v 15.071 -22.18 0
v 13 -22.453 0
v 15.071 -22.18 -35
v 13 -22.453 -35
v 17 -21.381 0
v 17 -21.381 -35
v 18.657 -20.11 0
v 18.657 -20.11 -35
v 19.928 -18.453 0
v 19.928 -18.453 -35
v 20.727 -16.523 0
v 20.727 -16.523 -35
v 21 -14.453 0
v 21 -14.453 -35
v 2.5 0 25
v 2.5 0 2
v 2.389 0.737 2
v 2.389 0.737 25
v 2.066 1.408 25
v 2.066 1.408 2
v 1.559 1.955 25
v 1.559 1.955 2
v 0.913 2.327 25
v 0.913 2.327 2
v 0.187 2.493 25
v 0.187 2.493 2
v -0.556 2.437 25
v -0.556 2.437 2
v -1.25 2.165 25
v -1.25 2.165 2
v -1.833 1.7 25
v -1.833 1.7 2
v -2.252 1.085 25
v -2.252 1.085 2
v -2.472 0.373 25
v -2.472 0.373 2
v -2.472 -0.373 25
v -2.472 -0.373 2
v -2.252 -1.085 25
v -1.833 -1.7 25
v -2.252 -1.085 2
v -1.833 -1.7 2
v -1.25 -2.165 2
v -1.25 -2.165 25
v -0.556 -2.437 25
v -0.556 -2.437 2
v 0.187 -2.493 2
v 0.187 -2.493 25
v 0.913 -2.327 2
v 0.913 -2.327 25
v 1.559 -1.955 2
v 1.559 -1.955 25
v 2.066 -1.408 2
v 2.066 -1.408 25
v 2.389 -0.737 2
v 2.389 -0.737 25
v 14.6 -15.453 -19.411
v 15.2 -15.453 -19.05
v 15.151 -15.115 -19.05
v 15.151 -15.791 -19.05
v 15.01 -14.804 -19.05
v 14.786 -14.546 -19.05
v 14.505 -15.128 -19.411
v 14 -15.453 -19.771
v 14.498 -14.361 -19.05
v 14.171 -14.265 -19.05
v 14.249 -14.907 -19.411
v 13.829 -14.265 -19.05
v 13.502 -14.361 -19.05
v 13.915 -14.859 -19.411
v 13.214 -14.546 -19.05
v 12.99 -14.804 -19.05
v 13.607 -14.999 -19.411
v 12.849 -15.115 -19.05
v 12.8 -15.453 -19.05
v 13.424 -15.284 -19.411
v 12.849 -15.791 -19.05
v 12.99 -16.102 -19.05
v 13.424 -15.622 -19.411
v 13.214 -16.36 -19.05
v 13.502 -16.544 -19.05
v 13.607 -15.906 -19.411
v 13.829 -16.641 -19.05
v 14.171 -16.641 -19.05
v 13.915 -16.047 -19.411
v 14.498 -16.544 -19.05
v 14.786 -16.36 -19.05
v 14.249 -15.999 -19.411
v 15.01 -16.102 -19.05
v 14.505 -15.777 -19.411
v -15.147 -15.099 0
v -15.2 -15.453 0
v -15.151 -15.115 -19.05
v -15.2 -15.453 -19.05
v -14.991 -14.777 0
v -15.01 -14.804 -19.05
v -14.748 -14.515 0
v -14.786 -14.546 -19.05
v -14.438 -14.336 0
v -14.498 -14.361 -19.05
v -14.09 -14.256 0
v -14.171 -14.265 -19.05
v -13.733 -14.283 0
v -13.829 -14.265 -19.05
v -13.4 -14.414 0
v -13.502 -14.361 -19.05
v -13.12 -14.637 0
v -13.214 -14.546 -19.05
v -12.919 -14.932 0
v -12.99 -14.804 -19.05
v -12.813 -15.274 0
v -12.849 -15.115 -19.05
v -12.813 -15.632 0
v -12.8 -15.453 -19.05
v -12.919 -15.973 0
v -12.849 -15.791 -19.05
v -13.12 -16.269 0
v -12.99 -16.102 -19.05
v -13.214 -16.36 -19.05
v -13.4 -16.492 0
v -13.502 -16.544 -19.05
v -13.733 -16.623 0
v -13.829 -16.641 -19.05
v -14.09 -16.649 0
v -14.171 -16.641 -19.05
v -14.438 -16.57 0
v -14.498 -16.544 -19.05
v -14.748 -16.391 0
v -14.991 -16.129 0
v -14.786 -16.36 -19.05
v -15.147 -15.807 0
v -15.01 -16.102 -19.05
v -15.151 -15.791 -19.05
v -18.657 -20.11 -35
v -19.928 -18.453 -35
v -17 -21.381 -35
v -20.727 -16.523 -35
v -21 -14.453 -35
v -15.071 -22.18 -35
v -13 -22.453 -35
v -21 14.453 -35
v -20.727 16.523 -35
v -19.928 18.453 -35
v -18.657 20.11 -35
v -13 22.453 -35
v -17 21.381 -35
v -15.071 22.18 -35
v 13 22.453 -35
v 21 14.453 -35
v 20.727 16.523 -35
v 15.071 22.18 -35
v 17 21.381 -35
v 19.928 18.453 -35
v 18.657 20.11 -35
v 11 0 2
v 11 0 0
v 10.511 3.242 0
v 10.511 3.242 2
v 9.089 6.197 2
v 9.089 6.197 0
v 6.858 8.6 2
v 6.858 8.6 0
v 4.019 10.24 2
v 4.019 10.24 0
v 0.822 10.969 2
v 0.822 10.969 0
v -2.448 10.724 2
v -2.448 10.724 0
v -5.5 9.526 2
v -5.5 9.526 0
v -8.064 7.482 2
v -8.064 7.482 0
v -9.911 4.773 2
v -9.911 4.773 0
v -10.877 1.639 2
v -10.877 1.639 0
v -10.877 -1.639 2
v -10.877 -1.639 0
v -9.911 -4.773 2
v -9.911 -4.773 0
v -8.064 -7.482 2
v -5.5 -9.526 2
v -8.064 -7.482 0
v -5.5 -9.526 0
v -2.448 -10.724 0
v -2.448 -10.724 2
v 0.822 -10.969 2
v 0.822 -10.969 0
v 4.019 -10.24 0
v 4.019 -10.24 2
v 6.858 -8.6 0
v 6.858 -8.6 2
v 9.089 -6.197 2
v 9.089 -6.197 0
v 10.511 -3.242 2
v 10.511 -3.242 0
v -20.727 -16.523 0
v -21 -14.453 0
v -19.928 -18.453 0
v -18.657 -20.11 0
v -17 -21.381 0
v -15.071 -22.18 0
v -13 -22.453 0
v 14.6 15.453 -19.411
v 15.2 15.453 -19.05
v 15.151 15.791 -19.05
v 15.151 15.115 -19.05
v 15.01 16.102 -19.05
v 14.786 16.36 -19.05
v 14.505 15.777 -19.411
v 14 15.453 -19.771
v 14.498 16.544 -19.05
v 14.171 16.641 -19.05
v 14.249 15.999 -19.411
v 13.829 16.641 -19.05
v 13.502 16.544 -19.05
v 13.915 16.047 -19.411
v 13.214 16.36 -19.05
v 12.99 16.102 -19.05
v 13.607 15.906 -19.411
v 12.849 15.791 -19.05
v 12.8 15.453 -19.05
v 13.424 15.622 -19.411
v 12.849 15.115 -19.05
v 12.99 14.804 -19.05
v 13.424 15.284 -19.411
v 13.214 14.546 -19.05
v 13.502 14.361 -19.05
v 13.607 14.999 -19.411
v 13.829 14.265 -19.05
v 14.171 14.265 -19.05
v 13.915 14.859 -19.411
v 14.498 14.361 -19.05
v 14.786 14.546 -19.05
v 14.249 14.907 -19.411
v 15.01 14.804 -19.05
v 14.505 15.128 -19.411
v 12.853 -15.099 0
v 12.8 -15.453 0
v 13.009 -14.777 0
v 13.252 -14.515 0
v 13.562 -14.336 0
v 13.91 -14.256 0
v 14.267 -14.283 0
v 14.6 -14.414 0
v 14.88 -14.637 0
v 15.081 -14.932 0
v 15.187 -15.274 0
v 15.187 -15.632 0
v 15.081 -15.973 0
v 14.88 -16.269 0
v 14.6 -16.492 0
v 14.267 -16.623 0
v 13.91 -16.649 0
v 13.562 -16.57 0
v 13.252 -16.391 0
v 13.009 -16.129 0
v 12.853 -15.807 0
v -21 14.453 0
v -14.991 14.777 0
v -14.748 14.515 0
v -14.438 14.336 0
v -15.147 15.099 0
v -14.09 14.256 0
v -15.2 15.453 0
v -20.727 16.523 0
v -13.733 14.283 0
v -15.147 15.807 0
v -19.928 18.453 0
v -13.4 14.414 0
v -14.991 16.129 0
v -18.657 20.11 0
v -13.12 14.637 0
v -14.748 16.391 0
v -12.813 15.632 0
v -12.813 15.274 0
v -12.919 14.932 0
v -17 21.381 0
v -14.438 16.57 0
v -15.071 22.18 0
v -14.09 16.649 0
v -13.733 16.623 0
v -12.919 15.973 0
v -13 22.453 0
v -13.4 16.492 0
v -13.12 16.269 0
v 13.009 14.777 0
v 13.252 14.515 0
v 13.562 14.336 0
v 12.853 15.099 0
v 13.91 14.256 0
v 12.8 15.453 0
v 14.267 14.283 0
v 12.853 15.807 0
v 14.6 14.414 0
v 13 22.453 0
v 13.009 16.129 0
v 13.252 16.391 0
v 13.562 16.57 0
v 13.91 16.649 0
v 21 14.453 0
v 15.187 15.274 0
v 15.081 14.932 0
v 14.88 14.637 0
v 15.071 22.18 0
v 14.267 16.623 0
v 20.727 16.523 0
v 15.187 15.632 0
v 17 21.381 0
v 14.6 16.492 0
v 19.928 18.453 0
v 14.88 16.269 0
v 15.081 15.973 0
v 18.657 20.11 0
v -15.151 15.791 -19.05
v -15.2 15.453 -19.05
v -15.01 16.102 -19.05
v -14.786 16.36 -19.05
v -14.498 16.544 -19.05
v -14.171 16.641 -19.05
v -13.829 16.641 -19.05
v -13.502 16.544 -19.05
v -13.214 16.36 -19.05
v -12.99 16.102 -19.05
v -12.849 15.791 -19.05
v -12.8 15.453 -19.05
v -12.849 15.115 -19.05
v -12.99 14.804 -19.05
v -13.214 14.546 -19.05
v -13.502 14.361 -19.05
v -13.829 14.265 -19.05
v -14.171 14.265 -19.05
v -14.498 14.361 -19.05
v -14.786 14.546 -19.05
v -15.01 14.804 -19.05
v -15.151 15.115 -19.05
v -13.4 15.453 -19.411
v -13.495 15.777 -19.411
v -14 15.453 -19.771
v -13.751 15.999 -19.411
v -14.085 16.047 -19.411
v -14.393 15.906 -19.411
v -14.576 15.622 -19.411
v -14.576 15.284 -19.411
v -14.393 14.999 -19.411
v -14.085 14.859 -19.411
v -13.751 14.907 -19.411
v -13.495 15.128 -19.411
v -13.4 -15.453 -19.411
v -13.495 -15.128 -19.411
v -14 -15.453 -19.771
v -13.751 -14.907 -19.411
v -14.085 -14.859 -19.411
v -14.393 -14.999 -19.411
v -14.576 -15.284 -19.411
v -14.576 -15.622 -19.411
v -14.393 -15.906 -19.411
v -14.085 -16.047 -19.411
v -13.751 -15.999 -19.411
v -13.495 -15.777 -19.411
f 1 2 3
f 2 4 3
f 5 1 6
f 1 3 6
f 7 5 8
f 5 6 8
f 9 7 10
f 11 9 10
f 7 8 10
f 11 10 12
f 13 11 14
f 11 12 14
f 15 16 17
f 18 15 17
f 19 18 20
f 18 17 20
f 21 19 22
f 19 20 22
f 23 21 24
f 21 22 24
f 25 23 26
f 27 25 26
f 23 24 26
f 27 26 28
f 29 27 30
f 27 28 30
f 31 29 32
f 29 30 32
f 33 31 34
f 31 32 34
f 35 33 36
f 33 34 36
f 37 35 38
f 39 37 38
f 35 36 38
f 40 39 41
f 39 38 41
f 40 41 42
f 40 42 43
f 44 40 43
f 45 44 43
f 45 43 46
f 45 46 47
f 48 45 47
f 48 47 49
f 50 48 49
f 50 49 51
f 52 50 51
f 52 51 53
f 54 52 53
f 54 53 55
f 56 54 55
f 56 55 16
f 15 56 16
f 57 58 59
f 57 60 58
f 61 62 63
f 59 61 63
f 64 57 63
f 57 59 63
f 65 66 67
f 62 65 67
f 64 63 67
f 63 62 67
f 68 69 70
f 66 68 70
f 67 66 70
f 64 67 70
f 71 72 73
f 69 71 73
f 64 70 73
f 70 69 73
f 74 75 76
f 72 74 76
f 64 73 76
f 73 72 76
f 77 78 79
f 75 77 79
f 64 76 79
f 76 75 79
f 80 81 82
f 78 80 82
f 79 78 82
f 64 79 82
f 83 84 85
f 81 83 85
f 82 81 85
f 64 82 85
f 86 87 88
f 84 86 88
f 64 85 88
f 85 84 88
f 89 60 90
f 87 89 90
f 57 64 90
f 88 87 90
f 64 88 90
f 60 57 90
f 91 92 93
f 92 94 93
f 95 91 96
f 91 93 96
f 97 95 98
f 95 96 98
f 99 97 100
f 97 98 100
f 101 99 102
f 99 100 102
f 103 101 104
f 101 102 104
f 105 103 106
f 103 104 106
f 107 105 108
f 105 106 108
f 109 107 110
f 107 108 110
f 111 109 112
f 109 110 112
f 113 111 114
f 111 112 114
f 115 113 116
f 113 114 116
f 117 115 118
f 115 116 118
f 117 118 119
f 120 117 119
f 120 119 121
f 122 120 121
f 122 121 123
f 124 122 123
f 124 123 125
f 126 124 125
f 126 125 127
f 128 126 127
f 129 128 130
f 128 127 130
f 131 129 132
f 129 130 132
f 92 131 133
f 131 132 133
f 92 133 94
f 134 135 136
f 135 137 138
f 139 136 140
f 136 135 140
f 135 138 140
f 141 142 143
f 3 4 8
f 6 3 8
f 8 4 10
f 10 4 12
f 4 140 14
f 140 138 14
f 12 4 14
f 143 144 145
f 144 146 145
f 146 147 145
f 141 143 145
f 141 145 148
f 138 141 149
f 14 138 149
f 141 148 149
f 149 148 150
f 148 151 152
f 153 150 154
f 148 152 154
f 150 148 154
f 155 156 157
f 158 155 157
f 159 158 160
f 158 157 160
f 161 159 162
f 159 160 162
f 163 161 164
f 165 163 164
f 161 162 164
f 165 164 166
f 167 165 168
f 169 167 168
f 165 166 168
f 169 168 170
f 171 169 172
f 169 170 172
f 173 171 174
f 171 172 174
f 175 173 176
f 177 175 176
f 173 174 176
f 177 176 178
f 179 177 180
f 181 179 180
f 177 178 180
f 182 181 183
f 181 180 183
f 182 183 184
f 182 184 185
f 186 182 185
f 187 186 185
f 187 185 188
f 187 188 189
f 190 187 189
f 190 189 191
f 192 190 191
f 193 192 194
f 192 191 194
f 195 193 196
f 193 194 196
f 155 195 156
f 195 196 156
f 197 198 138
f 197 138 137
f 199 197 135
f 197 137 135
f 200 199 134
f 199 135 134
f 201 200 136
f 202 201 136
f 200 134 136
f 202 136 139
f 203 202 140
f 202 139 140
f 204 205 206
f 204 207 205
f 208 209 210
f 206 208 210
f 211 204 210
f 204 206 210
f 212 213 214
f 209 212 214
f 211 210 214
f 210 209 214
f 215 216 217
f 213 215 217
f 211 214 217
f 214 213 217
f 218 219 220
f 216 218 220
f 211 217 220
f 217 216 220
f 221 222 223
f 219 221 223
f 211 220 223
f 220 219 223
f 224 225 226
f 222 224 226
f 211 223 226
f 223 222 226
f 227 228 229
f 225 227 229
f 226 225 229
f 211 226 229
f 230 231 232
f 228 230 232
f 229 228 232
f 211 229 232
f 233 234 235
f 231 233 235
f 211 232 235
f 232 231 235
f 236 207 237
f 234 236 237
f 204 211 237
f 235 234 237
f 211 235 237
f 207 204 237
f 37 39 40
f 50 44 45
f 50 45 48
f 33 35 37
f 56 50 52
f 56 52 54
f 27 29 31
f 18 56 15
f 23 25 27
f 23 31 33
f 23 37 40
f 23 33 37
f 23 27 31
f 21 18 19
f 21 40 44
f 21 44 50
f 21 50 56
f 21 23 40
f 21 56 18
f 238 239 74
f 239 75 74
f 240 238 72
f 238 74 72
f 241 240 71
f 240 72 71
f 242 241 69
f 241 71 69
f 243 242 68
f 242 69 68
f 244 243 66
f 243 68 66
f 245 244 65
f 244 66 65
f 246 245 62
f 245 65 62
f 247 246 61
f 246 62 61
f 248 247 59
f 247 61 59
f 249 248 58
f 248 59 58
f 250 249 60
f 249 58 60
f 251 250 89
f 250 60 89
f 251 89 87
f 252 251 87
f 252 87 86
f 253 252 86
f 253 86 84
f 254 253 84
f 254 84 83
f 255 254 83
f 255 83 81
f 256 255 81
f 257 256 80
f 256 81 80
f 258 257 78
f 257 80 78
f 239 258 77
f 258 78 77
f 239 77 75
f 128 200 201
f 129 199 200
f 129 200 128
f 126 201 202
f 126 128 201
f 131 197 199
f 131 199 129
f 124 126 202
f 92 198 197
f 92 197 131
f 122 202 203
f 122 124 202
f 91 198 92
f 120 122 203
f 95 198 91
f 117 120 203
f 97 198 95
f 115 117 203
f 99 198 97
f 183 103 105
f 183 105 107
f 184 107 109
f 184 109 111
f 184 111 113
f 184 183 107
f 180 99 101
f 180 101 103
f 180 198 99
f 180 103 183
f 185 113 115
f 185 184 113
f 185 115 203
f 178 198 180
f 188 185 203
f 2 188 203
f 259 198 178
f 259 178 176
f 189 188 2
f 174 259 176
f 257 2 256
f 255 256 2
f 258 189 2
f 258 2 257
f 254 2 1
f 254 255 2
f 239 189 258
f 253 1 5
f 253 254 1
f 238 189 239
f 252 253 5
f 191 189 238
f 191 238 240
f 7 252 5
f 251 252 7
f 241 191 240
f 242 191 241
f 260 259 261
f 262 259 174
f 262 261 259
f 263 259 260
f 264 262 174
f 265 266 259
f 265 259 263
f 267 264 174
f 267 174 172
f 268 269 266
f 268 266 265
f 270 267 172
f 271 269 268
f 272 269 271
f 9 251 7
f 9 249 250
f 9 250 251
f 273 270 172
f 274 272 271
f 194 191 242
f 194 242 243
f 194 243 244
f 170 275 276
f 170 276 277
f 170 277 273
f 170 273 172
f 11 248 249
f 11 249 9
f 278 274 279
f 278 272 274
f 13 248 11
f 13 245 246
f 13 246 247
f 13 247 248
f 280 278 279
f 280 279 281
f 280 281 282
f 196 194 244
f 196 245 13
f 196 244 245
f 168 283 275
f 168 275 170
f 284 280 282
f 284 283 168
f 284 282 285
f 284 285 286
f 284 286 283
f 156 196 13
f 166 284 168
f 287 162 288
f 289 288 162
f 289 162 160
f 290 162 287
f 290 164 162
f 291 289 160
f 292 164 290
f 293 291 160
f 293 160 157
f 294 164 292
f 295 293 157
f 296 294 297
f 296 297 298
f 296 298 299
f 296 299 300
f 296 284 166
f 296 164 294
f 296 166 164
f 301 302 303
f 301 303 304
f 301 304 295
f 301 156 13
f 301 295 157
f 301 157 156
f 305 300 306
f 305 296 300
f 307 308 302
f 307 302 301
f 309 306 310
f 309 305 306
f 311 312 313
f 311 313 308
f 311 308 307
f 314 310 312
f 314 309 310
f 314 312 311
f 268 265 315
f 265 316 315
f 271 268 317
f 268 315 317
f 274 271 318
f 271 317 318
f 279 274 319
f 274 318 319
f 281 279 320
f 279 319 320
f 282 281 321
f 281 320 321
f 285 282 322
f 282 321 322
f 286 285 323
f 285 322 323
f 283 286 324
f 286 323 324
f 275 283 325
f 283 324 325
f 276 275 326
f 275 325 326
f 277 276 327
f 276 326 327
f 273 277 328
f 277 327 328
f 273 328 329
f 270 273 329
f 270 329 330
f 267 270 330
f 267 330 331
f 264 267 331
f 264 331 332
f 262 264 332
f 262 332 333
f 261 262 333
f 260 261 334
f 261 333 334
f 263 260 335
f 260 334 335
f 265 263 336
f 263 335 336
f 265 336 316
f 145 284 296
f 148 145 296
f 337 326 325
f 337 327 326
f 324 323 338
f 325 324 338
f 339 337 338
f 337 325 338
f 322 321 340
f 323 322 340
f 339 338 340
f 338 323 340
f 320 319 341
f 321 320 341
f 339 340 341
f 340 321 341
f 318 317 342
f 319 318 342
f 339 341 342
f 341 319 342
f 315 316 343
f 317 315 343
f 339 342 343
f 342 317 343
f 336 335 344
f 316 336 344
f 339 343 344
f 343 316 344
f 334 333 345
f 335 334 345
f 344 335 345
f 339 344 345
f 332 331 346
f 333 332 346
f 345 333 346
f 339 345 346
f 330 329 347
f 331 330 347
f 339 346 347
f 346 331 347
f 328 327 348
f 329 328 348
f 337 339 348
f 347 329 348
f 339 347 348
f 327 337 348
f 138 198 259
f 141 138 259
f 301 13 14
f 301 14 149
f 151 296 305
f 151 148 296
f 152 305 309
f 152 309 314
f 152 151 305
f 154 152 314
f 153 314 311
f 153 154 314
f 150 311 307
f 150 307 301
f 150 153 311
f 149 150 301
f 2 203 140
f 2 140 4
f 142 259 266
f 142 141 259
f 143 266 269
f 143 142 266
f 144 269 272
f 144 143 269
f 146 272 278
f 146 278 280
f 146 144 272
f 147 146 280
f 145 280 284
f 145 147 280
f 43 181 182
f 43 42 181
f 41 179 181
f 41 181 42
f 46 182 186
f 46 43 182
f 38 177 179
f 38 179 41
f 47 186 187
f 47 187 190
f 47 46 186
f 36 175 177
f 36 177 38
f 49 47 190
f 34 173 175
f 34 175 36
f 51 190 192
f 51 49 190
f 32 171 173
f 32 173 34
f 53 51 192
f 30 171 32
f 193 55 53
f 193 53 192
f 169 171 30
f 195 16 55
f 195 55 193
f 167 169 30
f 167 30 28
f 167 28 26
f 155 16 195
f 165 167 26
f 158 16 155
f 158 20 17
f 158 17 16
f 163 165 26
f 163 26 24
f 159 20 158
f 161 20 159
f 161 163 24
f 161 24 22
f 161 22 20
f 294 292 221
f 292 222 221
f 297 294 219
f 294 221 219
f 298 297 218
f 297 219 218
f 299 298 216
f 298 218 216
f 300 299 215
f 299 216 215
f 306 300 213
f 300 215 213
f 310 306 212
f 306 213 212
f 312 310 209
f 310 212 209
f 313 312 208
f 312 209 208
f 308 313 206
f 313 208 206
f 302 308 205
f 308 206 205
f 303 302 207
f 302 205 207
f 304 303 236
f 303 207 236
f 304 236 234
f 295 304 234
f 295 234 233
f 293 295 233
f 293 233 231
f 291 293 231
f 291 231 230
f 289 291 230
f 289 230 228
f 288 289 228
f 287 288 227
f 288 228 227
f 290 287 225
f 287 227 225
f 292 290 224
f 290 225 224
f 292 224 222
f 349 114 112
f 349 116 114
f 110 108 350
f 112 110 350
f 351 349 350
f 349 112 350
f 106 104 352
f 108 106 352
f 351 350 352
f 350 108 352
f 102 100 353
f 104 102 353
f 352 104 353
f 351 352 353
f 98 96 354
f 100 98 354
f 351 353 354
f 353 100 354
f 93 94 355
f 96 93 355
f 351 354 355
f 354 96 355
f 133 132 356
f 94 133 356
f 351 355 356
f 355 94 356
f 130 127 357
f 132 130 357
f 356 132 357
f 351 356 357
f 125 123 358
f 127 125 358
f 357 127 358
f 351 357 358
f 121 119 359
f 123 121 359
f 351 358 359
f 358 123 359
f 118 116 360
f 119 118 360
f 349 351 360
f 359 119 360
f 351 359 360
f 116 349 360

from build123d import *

# Parameters (mm, degrees)
F0_W     = 42
F0_H     = 44.9056578597
F0_R     = 1.5
F0_R_2   = 11
F0_R_3   = 2.5
F1_DEPTH = 35
F2_DEPTH = 2
F3_DEPTH = 25
F4_D     = 2.4
F4_DEPTH = 19.05
F4_TIP   = 0.7210327428
F5_R     = 8


with BuildPart() as f1:
    # F0 (on Top) → F1 (new body)
    with BuildSketch(Plane.XY):
        Rectangle(F0_W, F0_H)
        with Locations((-14, -15.4528289299)):
            Circle(F0_R, mode=Mode.SUBTRACT)
        with Locations((14, -15.4528289299)):
            Circle(F0_R, mode=Mode.SUBTRACT)
        Circle(F0_R_2, mode=Mode.SUBTRACT)
        with Locations((-14, 15.4528289299)):
            Circle(F0_R, mode=Mode.SUBTRACT)
        with Locations((14, 15.4528289299)):
            Circle(F0_R, mode=Mode.SUBTRACT)
        with Locations((-14, -15.4528289299)):
            Circle(F0_R)
        Circle(F0_R_2)
        Circle(F0_R_3, mode=Mode.SUBTRACT)
        Circle(F0_R_3)
        with Locations((14, -15.4528289299)):
            Circle(F0_R)
        with Locations((-14, 15.4528289299)):
            Circle(F0_R)
        with Locations((14, 15.4528289299)):
            Circle(F0_R)
    extrude(amount=-F1_DEPTH)

    # F0 (on Top) → F2 (join)
    with BuildSketch(Plane.XY):
        Circle(F0_R_2)
        Circle(F0_R_3, mode=Mode.SUBTRACT)
        Circle(F0_R_3)
    extrude(amount=F2_DEPTH)

    # F0 (on Top) → F3 (join)
    with BuildSketch(Plane.XY):
        Circle(F0_R_3)
    extrude(amount=F3_DEPTH)

    # F4
    with Locations(Plane.XY):
        with Locations((-14, 15.4528289299), (14, 15.4528289299), (14, -15.4528289299), (-14, -15.4528289299)):
            Hole(F4_D / 2, depth=F4_DEPTH)
            with Locations((0, 0, -(F4_DEPTH + F4_TIP / 2))):  # 118° drill point
                Cone(0, F4_D / 2, F4_TIP, mode=Mode.SUBTRACT)

    # F5
    f5_edges = [f1.edges().sort_by_distance(p)[0] for p in [
        (21, 22.452829, -17.5),
        (21, -22.452829, -17.5),
        (-21, 22.452829, -17.5),
        (-21, -22.452829, -17.5),
    ]]
    fillet(f5_edges, radius=F5_R)


solid = f1.part
